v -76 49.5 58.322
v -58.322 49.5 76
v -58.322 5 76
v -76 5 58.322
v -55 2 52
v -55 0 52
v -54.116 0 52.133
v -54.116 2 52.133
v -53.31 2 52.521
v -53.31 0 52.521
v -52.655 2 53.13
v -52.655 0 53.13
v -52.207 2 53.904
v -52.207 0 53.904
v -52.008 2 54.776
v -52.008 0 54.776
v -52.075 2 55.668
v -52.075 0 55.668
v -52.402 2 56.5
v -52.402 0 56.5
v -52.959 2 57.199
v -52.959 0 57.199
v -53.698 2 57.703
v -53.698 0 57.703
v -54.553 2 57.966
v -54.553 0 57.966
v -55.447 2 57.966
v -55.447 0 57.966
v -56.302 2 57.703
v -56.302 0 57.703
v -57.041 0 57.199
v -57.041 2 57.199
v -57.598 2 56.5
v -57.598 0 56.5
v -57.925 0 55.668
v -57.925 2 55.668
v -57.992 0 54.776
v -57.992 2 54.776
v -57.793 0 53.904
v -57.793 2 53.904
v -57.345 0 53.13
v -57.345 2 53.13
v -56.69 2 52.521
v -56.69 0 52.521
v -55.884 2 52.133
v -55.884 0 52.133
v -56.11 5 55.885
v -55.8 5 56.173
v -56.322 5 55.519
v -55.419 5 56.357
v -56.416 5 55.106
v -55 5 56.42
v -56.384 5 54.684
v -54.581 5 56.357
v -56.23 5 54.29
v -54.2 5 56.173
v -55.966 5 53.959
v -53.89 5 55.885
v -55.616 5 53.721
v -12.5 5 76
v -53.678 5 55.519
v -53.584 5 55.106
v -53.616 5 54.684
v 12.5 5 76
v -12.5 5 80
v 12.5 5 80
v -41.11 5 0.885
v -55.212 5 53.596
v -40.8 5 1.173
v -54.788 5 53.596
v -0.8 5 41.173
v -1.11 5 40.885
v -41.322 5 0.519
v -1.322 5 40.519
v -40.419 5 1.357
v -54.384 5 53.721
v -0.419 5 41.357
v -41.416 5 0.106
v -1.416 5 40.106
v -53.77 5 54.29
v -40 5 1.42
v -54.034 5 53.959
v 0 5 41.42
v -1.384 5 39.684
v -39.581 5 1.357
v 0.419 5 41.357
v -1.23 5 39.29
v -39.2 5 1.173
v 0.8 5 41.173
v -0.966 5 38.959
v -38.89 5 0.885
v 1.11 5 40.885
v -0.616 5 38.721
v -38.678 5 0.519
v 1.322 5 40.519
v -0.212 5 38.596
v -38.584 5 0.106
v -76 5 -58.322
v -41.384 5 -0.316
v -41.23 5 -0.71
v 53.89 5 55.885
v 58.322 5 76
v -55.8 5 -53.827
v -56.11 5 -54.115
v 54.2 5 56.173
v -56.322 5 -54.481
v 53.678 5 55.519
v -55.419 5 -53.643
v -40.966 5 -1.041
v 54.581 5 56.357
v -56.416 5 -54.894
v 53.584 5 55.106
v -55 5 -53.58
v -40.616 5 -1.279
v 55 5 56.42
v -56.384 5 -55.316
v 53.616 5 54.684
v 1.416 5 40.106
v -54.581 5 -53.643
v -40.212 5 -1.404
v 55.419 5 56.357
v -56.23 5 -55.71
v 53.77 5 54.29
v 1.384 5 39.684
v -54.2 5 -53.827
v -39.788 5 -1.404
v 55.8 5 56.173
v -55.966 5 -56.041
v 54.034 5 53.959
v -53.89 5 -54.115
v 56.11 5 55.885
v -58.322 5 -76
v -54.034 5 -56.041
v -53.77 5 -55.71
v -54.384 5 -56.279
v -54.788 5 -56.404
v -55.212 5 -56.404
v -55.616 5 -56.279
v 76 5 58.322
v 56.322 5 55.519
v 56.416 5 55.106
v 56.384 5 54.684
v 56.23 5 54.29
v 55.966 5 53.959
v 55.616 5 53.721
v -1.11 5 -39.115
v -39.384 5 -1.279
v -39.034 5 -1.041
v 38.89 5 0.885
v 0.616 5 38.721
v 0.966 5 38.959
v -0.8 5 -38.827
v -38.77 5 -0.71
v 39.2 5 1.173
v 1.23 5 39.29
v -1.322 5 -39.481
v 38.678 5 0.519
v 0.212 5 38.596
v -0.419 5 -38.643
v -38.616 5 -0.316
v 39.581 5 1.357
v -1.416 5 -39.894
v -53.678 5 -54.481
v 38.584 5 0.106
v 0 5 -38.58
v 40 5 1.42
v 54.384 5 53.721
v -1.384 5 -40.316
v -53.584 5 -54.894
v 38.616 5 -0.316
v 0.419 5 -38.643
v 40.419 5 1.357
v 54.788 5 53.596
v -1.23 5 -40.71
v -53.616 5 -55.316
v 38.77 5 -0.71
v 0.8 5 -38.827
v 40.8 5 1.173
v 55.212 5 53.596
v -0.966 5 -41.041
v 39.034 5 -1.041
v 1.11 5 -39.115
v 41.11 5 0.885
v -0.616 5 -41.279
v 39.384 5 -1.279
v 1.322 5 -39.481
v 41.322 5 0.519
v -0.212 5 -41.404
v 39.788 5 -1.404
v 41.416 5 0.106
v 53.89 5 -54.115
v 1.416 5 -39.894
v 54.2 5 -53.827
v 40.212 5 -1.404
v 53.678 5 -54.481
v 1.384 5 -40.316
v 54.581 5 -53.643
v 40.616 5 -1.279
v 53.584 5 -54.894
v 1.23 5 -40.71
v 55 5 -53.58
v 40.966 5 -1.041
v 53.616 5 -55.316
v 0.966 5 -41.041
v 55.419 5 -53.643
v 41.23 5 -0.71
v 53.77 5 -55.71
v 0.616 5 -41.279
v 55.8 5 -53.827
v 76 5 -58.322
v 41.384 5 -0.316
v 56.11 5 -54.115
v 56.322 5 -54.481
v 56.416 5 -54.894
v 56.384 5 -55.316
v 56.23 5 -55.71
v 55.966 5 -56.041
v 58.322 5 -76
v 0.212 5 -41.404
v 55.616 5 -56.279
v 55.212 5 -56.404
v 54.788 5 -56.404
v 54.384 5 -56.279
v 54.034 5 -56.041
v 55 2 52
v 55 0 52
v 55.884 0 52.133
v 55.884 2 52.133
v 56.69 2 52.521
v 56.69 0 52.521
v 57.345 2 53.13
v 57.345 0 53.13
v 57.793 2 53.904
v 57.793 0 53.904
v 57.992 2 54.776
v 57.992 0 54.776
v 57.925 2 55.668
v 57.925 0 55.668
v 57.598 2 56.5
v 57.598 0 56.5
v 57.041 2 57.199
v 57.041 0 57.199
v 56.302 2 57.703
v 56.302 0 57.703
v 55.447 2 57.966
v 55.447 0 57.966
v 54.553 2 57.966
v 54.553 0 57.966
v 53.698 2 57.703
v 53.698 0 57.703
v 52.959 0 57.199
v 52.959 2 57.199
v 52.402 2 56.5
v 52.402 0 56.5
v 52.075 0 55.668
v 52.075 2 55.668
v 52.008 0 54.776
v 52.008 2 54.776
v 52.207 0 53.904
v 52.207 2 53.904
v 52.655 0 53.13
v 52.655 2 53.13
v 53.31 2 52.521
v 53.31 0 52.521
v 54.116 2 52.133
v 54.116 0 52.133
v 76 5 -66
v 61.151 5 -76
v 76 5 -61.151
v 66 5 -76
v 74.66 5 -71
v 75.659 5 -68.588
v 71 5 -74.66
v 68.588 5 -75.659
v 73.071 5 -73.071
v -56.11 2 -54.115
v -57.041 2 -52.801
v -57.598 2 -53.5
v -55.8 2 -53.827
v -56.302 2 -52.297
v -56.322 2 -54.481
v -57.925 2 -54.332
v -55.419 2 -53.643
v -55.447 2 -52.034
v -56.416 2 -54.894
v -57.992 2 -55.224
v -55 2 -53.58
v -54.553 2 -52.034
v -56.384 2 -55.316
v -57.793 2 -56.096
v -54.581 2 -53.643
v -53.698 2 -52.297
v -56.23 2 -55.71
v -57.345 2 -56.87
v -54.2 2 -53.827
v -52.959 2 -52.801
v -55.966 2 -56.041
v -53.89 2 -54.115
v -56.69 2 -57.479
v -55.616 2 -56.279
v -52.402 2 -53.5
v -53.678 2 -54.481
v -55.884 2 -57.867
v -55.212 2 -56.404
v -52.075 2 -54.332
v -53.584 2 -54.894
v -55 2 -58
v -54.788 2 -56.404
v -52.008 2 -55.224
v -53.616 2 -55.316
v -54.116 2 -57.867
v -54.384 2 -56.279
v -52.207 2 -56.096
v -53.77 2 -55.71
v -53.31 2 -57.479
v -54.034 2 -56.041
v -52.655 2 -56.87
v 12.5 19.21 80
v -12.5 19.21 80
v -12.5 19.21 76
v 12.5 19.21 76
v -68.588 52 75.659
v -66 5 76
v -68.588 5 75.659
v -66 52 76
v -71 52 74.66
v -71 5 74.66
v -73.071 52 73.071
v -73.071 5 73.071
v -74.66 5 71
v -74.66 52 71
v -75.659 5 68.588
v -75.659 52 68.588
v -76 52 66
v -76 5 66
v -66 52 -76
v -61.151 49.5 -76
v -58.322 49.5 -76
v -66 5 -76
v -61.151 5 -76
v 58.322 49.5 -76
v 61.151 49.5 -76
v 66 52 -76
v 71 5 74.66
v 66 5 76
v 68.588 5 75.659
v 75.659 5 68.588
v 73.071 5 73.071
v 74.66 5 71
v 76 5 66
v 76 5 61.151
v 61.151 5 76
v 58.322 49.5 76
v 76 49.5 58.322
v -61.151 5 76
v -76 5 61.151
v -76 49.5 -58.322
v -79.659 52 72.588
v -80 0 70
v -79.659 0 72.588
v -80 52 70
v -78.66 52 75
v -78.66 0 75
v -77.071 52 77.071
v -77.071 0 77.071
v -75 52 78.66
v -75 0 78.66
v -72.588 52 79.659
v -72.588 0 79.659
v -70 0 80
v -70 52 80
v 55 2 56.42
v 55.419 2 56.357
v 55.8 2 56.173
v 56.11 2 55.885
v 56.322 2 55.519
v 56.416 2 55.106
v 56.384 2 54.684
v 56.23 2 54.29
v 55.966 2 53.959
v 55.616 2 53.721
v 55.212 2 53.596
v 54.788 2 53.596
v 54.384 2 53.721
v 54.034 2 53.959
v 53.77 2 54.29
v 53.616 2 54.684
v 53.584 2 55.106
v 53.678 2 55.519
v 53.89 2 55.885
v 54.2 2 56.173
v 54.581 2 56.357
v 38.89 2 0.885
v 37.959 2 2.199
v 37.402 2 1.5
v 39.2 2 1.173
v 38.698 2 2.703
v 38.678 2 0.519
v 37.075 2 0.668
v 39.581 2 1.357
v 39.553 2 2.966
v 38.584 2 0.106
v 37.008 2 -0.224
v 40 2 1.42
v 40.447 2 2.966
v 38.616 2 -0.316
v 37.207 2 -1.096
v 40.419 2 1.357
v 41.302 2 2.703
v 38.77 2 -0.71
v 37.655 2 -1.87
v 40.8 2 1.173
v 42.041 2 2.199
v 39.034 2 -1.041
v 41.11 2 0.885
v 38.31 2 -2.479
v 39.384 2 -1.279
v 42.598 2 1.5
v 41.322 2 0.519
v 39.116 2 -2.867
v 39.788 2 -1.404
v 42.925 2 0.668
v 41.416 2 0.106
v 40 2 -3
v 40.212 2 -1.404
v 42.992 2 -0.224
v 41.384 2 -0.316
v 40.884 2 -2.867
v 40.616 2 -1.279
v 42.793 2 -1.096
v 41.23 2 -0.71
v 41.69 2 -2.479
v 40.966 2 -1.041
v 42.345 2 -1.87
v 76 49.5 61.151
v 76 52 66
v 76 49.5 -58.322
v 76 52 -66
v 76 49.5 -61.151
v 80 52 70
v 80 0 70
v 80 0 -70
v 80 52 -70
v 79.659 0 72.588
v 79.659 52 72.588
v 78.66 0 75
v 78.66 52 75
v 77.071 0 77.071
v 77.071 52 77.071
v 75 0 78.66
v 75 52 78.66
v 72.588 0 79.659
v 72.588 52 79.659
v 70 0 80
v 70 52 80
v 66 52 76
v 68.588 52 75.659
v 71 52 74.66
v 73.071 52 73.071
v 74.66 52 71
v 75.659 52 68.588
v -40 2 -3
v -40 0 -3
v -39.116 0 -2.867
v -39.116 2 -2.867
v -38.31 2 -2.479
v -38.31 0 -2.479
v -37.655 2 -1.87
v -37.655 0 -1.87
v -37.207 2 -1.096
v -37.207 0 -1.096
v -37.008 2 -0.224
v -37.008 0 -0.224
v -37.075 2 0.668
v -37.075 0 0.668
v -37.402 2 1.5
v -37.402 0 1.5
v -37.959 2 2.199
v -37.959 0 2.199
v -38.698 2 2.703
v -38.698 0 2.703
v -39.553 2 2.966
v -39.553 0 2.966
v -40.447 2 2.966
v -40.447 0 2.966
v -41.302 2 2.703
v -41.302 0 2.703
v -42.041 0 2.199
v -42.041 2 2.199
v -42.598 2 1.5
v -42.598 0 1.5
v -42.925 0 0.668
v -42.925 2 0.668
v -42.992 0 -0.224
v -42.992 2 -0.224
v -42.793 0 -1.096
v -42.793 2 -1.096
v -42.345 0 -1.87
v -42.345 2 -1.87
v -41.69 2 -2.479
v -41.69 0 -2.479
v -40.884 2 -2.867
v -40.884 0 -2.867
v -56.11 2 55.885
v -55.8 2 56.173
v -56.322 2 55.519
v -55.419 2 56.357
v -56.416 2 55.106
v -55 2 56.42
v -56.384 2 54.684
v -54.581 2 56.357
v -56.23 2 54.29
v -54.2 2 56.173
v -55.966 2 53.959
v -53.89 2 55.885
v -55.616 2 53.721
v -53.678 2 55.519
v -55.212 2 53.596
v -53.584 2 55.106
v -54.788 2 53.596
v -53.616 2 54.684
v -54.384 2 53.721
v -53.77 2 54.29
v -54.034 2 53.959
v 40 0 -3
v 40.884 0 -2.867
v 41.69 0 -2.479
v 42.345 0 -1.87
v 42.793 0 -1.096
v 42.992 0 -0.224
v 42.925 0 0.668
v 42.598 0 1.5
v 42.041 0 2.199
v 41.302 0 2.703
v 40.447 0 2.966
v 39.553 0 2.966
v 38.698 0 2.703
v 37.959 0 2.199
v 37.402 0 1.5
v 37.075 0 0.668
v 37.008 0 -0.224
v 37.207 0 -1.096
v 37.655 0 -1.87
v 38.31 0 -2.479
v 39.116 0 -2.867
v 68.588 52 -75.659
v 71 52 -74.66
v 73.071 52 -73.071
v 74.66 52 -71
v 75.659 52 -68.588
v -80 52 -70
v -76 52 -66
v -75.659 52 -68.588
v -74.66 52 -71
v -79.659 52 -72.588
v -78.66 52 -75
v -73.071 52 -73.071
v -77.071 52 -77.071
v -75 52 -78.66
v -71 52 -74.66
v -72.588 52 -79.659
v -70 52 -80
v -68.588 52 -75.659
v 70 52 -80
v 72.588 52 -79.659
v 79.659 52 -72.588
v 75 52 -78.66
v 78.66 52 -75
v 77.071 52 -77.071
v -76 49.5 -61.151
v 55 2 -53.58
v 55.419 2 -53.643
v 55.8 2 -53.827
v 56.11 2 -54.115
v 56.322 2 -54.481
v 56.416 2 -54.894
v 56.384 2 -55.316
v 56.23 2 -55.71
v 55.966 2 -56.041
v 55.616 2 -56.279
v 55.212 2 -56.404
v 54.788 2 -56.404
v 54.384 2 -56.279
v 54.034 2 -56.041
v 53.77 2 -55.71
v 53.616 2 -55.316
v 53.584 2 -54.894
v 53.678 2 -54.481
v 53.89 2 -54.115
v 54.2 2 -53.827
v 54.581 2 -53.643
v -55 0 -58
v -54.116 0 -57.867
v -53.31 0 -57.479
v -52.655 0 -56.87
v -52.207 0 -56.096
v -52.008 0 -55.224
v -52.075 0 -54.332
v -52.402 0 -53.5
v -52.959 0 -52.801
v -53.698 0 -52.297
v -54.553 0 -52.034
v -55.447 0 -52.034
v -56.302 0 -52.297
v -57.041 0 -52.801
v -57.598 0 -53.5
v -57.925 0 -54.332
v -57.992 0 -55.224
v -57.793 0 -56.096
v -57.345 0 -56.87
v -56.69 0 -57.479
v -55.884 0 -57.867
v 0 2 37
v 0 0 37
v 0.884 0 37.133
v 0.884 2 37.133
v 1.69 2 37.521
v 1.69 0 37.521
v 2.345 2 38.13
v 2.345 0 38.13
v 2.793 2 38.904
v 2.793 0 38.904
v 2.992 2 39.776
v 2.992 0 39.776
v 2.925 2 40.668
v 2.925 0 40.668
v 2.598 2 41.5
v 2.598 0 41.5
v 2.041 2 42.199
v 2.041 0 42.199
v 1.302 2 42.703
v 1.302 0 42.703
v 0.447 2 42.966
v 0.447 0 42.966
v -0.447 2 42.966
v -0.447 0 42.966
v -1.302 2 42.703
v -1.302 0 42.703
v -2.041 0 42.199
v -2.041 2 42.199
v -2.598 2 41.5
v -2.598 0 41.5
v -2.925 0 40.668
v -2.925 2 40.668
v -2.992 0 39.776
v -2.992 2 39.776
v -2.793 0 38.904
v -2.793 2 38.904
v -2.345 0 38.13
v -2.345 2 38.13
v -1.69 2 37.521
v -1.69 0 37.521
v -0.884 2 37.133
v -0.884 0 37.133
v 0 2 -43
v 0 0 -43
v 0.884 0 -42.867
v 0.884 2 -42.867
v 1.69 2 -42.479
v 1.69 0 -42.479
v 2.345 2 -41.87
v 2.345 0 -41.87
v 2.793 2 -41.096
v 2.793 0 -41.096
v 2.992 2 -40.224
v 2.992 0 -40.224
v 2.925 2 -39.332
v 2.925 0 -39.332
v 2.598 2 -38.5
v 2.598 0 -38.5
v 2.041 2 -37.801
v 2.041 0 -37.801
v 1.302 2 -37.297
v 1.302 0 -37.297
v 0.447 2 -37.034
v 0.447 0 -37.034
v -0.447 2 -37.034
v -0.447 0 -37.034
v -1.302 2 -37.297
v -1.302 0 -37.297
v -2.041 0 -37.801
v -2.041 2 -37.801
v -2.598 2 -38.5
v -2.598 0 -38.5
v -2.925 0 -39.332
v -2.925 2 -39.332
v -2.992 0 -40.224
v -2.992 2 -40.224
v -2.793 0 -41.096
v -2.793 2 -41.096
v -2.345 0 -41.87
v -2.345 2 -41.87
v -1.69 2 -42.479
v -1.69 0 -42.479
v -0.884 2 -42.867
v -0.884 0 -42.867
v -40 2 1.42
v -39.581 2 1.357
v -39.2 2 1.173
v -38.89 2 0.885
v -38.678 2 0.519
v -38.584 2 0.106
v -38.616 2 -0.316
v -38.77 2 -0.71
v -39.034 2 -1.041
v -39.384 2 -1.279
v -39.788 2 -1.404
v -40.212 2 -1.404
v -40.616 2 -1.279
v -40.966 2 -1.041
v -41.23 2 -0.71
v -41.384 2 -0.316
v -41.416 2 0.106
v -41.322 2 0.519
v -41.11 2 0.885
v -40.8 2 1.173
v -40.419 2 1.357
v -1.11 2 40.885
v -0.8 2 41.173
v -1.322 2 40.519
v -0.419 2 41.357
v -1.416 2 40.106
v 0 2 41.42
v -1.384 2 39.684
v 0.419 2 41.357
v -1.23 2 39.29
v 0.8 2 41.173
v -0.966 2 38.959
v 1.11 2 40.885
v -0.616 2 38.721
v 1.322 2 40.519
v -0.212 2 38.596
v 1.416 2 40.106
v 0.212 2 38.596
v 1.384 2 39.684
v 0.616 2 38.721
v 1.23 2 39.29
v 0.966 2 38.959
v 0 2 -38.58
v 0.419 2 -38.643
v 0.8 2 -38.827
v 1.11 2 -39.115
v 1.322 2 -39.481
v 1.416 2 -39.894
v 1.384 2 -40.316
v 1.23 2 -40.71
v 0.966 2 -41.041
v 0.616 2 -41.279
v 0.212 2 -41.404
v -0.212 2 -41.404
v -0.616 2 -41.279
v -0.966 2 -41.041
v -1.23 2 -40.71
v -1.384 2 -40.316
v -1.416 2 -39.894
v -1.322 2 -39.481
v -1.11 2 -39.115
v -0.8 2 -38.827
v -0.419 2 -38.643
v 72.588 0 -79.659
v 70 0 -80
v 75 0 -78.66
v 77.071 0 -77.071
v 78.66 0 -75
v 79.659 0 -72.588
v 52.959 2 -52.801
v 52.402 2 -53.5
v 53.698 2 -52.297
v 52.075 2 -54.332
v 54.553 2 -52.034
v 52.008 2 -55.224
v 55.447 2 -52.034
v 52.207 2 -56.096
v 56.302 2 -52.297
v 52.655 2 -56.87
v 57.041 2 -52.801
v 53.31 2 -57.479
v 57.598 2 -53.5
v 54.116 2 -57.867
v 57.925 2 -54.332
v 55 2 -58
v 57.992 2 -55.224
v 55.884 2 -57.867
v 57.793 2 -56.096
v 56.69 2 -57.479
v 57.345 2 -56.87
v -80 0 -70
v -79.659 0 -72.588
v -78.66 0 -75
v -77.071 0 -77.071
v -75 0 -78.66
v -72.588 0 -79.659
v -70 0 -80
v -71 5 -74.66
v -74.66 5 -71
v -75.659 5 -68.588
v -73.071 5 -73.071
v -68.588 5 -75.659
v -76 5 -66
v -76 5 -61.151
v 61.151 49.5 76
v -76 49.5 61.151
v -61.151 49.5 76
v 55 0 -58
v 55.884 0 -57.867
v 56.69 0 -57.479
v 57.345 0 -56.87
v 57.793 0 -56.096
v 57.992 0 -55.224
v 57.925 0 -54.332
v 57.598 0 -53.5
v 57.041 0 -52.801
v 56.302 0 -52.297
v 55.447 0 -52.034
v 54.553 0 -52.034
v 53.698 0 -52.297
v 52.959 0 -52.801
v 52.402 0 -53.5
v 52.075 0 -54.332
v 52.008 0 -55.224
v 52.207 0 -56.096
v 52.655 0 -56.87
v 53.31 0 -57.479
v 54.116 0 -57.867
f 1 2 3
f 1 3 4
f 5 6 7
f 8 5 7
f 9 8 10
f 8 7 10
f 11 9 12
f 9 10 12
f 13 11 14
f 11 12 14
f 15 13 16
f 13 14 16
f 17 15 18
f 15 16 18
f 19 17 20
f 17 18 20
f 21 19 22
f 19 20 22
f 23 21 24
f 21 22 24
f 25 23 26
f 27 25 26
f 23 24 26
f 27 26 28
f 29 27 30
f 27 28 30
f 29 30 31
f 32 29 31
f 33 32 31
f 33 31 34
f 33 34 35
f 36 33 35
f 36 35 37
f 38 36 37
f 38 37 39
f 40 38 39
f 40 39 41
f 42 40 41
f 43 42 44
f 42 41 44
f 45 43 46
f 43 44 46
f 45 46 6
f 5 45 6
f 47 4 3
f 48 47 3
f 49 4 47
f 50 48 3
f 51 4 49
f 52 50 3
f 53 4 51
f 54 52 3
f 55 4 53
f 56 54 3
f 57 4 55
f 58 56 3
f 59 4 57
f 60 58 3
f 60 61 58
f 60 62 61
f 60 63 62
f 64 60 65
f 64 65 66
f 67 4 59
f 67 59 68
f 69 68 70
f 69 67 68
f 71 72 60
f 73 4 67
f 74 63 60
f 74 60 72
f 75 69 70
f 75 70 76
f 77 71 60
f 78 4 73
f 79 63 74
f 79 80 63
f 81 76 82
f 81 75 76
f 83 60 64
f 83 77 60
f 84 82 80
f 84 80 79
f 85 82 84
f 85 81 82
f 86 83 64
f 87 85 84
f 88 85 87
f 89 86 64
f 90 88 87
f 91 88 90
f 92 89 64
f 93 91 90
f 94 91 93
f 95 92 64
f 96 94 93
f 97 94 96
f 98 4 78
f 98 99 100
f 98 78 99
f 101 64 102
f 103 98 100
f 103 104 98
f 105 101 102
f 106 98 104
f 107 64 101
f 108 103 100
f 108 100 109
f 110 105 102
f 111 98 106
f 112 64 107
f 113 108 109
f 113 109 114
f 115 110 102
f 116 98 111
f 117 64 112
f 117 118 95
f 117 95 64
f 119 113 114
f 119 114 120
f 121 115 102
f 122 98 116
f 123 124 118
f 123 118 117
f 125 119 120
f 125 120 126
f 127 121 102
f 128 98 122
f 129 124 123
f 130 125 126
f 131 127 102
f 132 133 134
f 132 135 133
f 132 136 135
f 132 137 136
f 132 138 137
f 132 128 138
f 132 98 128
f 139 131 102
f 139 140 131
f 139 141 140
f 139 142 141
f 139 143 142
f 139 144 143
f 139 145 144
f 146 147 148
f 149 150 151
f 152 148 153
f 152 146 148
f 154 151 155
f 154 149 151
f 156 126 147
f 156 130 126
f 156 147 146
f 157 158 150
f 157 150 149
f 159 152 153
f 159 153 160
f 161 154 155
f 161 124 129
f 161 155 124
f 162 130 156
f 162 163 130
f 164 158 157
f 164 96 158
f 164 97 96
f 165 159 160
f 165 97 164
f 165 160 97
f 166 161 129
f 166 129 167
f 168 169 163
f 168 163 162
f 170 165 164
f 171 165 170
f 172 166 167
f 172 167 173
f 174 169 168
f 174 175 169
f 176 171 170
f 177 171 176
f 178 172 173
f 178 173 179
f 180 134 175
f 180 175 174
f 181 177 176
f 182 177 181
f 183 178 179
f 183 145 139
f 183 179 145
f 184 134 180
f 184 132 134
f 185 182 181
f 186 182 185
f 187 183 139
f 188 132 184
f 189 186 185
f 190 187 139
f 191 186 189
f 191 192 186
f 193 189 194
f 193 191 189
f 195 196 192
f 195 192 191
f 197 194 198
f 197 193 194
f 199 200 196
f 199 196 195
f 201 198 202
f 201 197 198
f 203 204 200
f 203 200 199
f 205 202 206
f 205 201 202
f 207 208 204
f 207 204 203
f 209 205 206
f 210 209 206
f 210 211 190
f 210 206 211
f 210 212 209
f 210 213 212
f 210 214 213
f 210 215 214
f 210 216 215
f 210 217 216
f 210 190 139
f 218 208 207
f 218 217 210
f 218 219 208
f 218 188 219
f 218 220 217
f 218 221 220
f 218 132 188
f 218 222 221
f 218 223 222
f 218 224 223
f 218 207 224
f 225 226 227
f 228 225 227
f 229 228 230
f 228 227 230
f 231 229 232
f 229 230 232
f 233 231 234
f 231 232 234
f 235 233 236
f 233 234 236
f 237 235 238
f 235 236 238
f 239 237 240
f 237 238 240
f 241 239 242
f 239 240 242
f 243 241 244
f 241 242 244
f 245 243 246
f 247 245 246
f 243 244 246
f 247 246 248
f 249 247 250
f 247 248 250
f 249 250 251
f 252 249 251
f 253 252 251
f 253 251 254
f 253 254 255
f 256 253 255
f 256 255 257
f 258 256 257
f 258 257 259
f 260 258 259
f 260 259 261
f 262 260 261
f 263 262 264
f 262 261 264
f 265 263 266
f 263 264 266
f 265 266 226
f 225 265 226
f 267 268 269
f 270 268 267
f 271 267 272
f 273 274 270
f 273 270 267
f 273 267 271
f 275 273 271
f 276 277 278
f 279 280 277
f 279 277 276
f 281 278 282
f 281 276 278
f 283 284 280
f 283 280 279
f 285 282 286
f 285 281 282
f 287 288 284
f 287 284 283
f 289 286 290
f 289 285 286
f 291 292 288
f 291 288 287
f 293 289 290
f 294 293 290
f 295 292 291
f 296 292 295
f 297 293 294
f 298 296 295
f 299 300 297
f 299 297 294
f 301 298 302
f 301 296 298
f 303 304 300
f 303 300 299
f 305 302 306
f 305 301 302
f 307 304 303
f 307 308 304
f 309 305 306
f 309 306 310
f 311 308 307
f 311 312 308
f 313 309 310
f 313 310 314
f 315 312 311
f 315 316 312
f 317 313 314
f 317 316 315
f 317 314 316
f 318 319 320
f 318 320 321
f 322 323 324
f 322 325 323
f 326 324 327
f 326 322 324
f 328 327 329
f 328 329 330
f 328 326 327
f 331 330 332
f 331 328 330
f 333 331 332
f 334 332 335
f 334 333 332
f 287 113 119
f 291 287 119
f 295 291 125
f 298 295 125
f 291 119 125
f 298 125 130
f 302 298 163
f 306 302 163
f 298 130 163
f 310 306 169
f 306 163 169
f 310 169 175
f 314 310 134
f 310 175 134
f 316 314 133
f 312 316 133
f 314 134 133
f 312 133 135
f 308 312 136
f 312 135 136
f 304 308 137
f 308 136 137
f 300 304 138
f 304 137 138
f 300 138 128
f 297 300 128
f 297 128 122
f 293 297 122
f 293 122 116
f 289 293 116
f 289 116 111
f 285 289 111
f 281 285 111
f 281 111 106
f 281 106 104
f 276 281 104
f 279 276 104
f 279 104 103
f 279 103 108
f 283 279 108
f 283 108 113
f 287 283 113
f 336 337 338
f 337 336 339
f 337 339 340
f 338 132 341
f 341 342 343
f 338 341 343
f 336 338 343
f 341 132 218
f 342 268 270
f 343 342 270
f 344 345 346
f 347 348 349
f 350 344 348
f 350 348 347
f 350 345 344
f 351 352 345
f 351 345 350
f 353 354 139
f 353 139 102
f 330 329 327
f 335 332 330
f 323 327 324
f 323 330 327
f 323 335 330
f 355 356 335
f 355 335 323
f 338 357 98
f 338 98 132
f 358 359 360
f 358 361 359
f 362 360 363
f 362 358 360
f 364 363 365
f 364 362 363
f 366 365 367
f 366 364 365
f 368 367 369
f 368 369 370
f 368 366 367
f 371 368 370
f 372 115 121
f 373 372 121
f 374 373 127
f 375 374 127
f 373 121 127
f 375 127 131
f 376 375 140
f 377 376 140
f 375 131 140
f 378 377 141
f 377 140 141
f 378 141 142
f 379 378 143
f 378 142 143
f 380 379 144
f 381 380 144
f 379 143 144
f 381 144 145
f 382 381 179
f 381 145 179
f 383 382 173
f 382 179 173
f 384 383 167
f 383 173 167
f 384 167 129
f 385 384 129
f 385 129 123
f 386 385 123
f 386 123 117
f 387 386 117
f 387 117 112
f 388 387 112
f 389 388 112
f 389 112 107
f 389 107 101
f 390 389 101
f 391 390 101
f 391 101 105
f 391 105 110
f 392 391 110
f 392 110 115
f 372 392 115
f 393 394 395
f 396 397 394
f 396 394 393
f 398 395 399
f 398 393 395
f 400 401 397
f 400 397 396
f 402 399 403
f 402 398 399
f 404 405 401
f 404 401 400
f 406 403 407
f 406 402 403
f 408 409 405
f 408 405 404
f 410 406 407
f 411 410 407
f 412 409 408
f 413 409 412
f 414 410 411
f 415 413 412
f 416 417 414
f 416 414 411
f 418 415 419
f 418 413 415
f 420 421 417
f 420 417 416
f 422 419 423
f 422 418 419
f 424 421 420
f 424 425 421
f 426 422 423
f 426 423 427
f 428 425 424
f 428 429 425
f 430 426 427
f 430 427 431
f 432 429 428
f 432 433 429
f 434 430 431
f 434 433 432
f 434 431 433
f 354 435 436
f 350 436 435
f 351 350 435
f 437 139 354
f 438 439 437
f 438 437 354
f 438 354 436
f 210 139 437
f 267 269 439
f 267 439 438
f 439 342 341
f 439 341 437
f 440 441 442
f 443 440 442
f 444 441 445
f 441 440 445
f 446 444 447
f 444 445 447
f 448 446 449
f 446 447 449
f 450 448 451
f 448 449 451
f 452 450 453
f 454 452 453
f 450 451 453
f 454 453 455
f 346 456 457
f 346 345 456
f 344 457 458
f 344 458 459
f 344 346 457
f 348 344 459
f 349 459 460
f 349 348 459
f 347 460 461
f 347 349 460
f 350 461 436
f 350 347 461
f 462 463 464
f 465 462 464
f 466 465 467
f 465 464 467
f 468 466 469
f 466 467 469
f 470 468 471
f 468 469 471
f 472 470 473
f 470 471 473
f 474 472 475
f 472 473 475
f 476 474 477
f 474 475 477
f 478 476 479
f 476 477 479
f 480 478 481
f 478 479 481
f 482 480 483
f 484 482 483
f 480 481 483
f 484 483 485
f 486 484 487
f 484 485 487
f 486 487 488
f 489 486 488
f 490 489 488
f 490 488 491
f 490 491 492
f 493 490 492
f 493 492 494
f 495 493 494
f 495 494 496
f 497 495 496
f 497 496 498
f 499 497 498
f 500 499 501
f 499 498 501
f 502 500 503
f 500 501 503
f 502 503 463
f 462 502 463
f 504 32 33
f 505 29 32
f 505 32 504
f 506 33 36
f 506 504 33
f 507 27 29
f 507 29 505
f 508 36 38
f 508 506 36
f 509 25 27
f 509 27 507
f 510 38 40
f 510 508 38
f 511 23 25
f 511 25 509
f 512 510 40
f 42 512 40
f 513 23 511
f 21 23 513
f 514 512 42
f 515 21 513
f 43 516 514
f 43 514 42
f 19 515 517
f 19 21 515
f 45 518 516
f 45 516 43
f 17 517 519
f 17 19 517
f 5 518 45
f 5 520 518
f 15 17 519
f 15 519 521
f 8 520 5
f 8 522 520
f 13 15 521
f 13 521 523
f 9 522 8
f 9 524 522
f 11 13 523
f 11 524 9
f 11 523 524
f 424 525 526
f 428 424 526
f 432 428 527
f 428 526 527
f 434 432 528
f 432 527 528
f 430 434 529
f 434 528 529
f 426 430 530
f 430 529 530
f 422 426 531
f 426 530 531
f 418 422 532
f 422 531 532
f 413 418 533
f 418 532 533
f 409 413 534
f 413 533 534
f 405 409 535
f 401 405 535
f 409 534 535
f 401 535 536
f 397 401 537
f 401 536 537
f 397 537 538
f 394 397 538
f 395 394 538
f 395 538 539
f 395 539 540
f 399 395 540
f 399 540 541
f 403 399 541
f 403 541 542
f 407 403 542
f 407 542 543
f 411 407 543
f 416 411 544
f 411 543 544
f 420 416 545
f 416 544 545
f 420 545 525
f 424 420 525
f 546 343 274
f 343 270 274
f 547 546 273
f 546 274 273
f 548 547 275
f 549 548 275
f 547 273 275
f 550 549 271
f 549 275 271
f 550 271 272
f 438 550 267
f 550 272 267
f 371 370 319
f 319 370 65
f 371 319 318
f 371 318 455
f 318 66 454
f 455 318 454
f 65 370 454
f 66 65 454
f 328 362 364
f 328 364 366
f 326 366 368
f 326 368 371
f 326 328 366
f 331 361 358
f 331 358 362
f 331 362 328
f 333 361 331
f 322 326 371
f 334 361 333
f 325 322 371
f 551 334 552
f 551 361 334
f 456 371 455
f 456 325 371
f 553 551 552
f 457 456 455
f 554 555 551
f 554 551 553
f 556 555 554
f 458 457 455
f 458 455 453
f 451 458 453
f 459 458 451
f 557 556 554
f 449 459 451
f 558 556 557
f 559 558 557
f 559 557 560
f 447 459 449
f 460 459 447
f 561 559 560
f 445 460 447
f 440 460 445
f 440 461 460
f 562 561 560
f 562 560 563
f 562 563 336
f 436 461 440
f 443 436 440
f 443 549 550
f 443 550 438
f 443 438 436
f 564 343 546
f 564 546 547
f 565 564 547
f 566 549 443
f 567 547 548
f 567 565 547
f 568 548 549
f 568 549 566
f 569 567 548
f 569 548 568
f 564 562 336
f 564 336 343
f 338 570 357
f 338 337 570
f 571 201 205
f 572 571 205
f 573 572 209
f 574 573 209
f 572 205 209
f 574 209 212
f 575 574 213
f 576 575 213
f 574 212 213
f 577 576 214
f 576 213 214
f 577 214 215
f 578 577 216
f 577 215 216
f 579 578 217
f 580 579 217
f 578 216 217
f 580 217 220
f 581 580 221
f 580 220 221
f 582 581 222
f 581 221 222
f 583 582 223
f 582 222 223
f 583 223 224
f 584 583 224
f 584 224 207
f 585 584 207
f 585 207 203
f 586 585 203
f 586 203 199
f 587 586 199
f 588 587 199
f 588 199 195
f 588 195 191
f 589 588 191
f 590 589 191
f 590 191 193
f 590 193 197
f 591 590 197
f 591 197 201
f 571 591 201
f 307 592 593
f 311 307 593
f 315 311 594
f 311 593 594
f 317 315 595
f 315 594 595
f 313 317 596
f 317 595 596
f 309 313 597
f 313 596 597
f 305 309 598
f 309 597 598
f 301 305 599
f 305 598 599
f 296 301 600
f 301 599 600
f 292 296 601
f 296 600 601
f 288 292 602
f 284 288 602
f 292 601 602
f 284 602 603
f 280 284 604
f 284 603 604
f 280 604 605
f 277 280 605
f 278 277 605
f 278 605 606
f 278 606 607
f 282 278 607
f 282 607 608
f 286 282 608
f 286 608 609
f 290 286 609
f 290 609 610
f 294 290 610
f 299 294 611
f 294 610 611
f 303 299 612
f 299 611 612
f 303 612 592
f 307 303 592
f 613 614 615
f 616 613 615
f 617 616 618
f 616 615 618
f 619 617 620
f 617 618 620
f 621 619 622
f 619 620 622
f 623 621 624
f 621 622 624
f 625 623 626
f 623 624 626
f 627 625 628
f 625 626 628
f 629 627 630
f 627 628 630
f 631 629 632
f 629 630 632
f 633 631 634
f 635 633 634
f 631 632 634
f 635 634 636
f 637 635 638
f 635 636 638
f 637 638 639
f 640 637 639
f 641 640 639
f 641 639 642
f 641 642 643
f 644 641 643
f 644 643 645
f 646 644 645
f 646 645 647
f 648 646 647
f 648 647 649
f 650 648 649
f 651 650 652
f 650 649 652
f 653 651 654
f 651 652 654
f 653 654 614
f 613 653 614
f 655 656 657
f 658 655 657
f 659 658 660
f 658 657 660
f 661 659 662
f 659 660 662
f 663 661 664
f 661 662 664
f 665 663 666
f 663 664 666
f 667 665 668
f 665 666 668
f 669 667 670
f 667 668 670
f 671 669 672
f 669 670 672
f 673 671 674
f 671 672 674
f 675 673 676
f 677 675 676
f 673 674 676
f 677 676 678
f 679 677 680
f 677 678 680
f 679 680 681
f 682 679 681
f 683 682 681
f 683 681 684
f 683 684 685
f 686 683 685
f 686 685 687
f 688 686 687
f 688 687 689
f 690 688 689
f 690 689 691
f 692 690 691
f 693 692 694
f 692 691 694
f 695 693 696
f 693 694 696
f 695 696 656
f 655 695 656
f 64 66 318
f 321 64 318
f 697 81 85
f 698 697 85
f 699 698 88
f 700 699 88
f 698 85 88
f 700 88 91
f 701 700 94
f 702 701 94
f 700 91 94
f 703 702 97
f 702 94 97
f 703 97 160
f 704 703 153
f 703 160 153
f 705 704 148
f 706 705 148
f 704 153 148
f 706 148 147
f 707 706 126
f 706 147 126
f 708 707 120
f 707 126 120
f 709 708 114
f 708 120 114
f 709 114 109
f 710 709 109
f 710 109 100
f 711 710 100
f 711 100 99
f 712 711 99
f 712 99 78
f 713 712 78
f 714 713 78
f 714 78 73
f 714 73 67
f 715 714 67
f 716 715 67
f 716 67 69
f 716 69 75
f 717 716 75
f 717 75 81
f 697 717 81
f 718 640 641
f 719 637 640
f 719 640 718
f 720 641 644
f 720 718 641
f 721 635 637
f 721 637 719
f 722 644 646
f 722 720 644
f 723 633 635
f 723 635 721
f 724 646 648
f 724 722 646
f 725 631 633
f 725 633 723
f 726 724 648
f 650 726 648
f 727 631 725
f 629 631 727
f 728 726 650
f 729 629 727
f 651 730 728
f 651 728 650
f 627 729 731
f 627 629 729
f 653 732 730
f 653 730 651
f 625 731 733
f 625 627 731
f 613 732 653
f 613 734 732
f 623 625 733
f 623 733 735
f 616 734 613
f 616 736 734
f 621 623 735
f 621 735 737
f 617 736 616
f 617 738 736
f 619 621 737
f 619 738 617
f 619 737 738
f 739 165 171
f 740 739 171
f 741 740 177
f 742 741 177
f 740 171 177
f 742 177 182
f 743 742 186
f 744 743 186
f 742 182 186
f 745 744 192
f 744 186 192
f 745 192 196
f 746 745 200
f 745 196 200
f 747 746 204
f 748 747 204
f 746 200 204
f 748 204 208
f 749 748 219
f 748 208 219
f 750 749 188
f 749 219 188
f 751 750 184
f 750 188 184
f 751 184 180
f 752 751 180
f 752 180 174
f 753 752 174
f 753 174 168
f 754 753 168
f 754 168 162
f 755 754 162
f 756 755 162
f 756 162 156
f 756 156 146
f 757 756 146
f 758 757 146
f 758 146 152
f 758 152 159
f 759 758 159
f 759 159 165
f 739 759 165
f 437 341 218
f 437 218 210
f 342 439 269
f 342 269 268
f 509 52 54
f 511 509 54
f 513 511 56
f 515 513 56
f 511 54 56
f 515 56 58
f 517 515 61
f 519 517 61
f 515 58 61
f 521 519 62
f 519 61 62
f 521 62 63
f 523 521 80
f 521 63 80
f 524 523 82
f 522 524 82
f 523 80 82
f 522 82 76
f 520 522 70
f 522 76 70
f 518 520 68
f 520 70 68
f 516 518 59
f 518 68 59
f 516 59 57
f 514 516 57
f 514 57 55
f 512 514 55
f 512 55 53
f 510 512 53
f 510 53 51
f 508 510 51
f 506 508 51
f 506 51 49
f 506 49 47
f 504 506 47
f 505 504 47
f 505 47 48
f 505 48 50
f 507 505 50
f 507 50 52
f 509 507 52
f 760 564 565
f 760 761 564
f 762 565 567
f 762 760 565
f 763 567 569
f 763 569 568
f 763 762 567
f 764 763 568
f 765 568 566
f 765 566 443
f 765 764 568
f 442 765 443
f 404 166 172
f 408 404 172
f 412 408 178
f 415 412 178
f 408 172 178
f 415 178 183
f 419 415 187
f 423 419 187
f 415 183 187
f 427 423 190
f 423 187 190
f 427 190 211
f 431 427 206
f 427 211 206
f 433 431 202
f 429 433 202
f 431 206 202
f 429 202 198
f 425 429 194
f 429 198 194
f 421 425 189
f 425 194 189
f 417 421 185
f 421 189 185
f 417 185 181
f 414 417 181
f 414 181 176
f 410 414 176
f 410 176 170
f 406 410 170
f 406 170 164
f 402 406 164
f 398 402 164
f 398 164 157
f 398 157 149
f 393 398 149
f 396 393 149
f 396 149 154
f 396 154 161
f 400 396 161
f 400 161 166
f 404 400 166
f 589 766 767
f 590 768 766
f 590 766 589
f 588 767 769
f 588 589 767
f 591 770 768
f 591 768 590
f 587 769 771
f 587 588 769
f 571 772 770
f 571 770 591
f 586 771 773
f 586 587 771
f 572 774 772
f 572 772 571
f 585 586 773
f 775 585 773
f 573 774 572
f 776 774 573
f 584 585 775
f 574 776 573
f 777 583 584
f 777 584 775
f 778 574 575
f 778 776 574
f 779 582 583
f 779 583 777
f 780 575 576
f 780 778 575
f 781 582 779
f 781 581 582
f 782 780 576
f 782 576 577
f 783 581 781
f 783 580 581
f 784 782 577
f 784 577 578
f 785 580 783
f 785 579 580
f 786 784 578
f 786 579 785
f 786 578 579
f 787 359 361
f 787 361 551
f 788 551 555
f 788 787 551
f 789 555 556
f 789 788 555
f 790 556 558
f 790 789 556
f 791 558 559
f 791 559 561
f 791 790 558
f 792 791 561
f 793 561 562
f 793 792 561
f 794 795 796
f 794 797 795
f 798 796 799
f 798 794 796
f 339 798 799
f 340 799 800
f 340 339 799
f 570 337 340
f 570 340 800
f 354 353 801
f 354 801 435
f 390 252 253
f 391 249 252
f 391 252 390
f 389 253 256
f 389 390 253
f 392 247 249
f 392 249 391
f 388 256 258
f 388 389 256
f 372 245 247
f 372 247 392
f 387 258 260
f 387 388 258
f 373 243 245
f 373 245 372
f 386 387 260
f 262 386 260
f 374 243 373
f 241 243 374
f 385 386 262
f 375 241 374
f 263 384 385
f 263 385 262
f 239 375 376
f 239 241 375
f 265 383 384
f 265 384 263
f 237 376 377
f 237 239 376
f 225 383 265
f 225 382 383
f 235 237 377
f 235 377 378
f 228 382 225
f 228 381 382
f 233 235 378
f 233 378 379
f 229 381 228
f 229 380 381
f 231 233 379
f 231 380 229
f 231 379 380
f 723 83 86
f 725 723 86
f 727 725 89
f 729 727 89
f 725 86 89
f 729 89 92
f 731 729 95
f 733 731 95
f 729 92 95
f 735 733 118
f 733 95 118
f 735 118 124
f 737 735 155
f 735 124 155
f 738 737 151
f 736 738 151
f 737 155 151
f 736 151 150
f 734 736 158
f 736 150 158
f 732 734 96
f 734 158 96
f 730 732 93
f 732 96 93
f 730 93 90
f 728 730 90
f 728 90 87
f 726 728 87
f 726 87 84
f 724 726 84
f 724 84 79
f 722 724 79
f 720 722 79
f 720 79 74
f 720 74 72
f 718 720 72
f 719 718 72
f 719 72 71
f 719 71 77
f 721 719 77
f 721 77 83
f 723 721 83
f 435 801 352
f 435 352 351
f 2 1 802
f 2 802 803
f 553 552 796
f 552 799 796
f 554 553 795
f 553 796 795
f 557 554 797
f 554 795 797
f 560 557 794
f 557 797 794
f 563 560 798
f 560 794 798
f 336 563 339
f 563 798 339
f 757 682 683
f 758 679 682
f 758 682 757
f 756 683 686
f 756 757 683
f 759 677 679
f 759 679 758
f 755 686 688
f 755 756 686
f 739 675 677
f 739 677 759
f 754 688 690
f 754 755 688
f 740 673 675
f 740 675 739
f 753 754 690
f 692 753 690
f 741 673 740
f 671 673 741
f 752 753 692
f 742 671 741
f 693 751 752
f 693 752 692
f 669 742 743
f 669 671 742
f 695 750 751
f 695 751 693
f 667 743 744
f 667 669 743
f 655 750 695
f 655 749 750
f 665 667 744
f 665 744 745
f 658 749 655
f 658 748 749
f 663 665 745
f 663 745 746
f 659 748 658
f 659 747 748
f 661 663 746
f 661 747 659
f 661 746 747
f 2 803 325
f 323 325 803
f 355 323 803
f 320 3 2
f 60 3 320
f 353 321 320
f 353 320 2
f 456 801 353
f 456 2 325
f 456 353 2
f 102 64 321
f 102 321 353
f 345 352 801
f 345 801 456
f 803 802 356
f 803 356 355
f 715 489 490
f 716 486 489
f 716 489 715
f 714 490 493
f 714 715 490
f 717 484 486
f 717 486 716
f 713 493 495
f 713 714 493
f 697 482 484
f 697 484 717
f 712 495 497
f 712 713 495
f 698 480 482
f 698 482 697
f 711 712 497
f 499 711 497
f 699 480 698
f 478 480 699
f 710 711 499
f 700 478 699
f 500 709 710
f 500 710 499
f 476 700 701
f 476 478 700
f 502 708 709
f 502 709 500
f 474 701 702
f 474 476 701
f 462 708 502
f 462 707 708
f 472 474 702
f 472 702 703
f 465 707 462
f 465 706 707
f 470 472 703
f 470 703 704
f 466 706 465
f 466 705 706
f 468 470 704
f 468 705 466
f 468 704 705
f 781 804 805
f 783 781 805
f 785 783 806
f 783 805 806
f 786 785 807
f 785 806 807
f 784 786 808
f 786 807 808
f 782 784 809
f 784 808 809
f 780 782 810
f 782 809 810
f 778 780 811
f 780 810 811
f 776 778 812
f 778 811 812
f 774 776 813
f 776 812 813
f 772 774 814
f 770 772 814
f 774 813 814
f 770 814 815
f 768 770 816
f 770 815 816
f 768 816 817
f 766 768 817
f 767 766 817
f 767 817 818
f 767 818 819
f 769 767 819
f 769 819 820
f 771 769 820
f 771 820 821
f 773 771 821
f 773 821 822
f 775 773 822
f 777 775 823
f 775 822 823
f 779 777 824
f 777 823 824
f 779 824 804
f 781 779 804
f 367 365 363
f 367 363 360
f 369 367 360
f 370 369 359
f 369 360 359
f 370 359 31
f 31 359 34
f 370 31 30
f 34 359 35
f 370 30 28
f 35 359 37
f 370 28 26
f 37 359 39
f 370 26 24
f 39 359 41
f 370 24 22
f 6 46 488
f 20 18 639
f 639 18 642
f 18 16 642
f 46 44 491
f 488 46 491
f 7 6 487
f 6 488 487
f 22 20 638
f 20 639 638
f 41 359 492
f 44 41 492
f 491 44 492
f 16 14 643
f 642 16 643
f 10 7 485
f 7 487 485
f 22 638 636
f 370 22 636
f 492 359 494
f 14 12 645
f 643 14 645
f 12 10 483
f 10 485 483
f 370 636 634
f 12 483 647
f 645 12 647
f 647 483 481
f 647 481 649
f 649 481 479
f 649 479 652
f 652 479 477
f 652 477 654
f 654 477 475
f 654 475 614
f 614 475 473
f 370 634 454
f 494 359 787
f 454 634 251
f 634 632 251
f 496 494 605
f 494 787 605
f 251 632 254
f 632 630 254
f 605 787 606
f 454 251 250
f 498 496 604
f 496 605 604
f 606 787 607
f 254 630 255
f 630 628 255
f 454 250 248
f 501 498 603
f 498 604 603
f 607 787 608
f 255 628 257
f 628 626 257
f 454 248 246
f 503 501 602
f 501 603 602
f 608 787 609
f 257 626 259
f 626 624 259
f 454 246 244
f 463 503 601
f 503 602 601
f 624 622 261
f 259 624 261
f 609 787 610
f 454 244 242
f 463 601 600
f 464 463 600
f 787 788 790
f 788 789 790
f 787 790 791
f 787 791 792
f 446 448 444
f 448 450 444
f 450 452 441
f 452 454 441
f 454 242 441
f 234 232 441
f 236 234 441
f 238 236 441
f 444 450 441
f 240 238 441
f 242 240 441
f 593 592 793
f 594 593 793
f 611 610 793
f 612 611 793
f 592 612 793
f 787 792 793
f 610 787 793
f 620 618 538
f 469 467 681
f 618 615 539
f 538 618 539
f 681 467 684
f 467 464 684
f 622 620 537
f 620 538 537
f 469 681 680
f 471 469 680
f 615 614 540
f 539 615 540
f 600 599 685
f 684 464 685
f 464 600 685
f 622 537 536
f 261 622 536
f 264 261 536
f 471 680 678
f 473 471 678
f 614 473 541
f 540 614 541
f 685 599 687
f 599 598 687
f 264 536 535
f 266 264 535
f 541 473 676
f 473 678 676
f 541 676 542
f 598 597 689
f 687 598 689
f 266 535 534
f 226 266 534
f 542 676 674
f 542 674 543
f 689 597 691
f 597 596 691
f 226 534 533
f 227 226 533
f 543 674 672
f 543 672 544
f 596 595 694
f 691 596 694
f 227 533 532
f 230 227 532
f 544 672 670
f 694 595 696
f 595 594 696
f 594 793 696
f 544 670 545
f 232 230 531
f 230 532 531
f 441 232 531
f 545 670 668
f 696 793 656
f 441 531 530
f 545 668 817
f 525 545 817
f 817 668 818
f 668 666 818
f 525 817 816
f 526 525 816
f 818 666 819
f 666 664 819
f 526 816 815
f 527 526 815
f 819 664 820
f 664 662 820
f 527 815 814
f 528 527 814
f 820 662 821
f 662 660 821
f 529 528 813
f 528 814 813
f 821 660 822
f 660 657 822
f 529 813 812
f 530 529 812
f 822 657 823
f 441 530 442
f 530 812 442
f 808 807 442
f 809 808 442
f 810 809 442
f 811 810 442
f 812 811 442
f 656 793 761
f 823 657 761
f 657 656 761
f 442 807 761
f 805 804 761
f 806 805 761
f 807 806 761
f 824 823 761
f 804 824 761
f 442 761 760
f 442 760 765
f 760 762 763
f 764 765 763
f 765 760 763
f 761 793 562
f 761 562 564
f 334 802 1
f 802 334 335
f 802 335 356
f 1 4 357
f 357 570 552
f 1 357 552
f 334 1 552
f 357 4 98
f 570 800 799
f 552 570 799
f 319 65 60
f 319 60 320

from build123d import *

# Parameters (mm, degrees)
SKETCH1_W           = 160
SKETCH1_H           = 160
SKETCH1_W_2         = 152
SKETCH1_H_2         = 152
BOSS_EXTRUDE1_DEPTH = 52
SKETCH2_W           = 160
SKETCH2_H           = 160
BOSS_EXTRUDE2_DEPTH = 5
SKETCH3_R           = 1.42
CUT_EXTRUDE1_DEPTH  = 10
SKETCH4_W           = 152
SKETCH4_H           = 152
CUT_EXTRUDE2_DEPTH  = 2.5
FILLET1_R           = 10
FILLET2_R           = 10
SKETCH5_R           = 3
CUT_EXTRUDE3_DEPTH  = 2
SKETCH7_W           = 25
SKETCH7_H           = 14.209603119
CUT_EXTRUDE4_DEPTH  = 10


with BuildPart() as part:
    # Sketch1 → Boss-Extrude1 (new body)
    # profile 1 of 5: a face of its own
    with BuildSketch(Plane(origin=(0, 0, 0), x_dir=(1, 0, 0), z_dir=(0, 1, 0))):
        Rectangle(SKETCH1_W, SKETCH1_H)
        Rectangle(SKETCH1_W_2, SKETCH1_H_2, mode=Mode.SUBTRACT)
    # profile 2 of 5: a face of its own
    with BuildSketch(Plane(origin=(0, 0, 0), x_dir=(1, 0, 0), z_dir=(0, 1, 0))):
        Polygon((-61.150757595, 76), (-76, 61.150757595), (-76, 58.32233047), (-58.32233047, 76), align=None)
    # profile 3 of 5: a face of its own
    with BuildSketch(Plane(origin=(0, 0, 0), x_dir=(1, 0, 0), z_dir=(0, 1, 0))):
        Polygon((-58.32233047, -76), (-76, -58.32233047), (-76, -61.150757595), (-61.150757595, -76), align=None)
    # profile 4 of 5: a face of its own
    with BuildSketch(Plane(origin=(0, 0, 0), x_dir=(1, 0, 0), z_dir=(0, 1, 0))):
        Polygon((76, -58.32233047), (58.32233047, -76), (61.150757595, -76), (76, -61.150757595), align=None)
    # profile 5 of 5: a face of its own
    with BuildSketch(Plane(origin=(0, 0, 0), x_dir=(1, 0, 0), z_dir=(0, 1, 0))):
        Polygon((61.150757595, 76), (58.32233047, 76), (76, 58.32233047), (76, 61.150757595), align=None)
    extrude(amount=BOSS_EXTRUDE1_DEPTH)

    # Sketch2 → Boss-Extrude2 (add)
    with BuildSketch(Plane(origin=(0, 0, 0), x_dir=(1, 0, 0), z_dir=(0, 1, 0))):
        Rectangle(SKETCH2_W, SKETCH2_H)
    extrude(amount=BOSS_EXTRUDE2_DEPTH)

    # Sketch3 → Cut-Extrude1 (cut)
    with BuildSketch(Plane(origin=(0, 5, 0), x_dir=(1, 0, 0), z_dir=(0, 1, 0))):
        with Locations(Location((-55, 55, 0), (0, 0, 270))):
            Circle(SKETCH3_R)
        with Locations(Location((55, 55, 0), (0, 0, 270))):
            Circle(SKETCH3_R)
        with Locations(Location((55, -55, 0), (0, 0, 270))):
            Circle(SKETCH3_R)
        with Locations(Location((-55, -55, 0), (0, 0, 270))):
            Circle(SKETCH3_R)
        with Locations(Location((0, 40, 0), (0, 0, 270))):
            Circle(SKETCH3_R)
        with Locations(Location((40, 0, 0), (0, 0, 270))):
            Circle(SKETCH3_R)
        with Locations(Location((0, -40, 0), (0, 0, 270))):
            Circle(SKETCH3_R)
        with Locations(Location((-40, 0, 0), (0, 0, 270))):
            Circle(SKETCH3_R)
    extrude(amount=-CUT_EXTRUDE1_DEPTH, mode=Mode.SUBTRACT)

    # Sketch4 → Cut-Extrude2 (cut)
    with BuildSketch(Plane(origin=(0, 52, 0), x_dir=(1, 0, 0), z_dir=(0, 1, 0))):
        Rectangle(SKETCH4_W, SKETCH4_H)
    extrude(amount=-CUT_EXTRUDE2_DEPTH, mode=Mode.SUBTRACT)

    # Fillet1
    fillet1_edges = [part.edges().sort_by_distance(p)[0] for p in [
        (-80, 26, 80),
        (-80, 26, -80),
        (80, 26, -80),
        (80, 26, 80),
    ]]
    fillet(fillet1_edges, radius=FILLET1_R)

    # Fillet2
    fillet2_edges = [part.edges().sort_by_distance(p)[0] for p in [
        (-76, 28.5, 76),
        (-76, 28.5, -76),
        (76, 28.5, 76),
        (76, 28.5, -76),
    ]]
    fillet(fillet2_edges, radius=FILLET2_R)

    # Sketch5 → Cut-Extrude3 (cut)
    with BuildSketch(Plane.XZ):
        with Locations(Location((-55, 55, 0), (0, 0, 270))):
            Circle(SKETCH5_R)
        with Locations(Location((55, 55, 0), (0, 0, 270))):
            Circle(SKETCH5_R)
        with Locations(Location((55, -55, 0), (0, 0, 270))):
            Circle(SKETCH5_R)
        with Locations(Location((-55, -55, 0), (0, 0, 270))):
            Circle(SKETCH5_R)
        with Locations(Location((0, 40, 0), (0, 0, 270))):
            Circle(SKETCH5_R)
        with Locations(Location((-40, 0, 0), (0, 0, 270))):
            Circle(SKETCH5_R)
        with Locations(Location((0, -40, 0), (0, 0, 270))):
            Circle(SKETCH5_R)
        with Locations(Location((40, 0, 0), (0, 0, 270))):
            Circle(SKETCH5_R)
    extrude(amount=-CUT_EXTRUDE3_DEPTH, mode=Mode.SUBTRACT)

    # Sketch7 → Cut-Extrude4 (cut)
    with BuildSketch(Plane.XY.offset(80)):
        with Locations((0, 12.10480156)):
            Rectangle(SKETCH7_W, SKETCH7_H)
    extrude(amount=-CUT_EXTRUDE4_DEPTH, mode=Mode.SUBTRACT)


solid = part.part
